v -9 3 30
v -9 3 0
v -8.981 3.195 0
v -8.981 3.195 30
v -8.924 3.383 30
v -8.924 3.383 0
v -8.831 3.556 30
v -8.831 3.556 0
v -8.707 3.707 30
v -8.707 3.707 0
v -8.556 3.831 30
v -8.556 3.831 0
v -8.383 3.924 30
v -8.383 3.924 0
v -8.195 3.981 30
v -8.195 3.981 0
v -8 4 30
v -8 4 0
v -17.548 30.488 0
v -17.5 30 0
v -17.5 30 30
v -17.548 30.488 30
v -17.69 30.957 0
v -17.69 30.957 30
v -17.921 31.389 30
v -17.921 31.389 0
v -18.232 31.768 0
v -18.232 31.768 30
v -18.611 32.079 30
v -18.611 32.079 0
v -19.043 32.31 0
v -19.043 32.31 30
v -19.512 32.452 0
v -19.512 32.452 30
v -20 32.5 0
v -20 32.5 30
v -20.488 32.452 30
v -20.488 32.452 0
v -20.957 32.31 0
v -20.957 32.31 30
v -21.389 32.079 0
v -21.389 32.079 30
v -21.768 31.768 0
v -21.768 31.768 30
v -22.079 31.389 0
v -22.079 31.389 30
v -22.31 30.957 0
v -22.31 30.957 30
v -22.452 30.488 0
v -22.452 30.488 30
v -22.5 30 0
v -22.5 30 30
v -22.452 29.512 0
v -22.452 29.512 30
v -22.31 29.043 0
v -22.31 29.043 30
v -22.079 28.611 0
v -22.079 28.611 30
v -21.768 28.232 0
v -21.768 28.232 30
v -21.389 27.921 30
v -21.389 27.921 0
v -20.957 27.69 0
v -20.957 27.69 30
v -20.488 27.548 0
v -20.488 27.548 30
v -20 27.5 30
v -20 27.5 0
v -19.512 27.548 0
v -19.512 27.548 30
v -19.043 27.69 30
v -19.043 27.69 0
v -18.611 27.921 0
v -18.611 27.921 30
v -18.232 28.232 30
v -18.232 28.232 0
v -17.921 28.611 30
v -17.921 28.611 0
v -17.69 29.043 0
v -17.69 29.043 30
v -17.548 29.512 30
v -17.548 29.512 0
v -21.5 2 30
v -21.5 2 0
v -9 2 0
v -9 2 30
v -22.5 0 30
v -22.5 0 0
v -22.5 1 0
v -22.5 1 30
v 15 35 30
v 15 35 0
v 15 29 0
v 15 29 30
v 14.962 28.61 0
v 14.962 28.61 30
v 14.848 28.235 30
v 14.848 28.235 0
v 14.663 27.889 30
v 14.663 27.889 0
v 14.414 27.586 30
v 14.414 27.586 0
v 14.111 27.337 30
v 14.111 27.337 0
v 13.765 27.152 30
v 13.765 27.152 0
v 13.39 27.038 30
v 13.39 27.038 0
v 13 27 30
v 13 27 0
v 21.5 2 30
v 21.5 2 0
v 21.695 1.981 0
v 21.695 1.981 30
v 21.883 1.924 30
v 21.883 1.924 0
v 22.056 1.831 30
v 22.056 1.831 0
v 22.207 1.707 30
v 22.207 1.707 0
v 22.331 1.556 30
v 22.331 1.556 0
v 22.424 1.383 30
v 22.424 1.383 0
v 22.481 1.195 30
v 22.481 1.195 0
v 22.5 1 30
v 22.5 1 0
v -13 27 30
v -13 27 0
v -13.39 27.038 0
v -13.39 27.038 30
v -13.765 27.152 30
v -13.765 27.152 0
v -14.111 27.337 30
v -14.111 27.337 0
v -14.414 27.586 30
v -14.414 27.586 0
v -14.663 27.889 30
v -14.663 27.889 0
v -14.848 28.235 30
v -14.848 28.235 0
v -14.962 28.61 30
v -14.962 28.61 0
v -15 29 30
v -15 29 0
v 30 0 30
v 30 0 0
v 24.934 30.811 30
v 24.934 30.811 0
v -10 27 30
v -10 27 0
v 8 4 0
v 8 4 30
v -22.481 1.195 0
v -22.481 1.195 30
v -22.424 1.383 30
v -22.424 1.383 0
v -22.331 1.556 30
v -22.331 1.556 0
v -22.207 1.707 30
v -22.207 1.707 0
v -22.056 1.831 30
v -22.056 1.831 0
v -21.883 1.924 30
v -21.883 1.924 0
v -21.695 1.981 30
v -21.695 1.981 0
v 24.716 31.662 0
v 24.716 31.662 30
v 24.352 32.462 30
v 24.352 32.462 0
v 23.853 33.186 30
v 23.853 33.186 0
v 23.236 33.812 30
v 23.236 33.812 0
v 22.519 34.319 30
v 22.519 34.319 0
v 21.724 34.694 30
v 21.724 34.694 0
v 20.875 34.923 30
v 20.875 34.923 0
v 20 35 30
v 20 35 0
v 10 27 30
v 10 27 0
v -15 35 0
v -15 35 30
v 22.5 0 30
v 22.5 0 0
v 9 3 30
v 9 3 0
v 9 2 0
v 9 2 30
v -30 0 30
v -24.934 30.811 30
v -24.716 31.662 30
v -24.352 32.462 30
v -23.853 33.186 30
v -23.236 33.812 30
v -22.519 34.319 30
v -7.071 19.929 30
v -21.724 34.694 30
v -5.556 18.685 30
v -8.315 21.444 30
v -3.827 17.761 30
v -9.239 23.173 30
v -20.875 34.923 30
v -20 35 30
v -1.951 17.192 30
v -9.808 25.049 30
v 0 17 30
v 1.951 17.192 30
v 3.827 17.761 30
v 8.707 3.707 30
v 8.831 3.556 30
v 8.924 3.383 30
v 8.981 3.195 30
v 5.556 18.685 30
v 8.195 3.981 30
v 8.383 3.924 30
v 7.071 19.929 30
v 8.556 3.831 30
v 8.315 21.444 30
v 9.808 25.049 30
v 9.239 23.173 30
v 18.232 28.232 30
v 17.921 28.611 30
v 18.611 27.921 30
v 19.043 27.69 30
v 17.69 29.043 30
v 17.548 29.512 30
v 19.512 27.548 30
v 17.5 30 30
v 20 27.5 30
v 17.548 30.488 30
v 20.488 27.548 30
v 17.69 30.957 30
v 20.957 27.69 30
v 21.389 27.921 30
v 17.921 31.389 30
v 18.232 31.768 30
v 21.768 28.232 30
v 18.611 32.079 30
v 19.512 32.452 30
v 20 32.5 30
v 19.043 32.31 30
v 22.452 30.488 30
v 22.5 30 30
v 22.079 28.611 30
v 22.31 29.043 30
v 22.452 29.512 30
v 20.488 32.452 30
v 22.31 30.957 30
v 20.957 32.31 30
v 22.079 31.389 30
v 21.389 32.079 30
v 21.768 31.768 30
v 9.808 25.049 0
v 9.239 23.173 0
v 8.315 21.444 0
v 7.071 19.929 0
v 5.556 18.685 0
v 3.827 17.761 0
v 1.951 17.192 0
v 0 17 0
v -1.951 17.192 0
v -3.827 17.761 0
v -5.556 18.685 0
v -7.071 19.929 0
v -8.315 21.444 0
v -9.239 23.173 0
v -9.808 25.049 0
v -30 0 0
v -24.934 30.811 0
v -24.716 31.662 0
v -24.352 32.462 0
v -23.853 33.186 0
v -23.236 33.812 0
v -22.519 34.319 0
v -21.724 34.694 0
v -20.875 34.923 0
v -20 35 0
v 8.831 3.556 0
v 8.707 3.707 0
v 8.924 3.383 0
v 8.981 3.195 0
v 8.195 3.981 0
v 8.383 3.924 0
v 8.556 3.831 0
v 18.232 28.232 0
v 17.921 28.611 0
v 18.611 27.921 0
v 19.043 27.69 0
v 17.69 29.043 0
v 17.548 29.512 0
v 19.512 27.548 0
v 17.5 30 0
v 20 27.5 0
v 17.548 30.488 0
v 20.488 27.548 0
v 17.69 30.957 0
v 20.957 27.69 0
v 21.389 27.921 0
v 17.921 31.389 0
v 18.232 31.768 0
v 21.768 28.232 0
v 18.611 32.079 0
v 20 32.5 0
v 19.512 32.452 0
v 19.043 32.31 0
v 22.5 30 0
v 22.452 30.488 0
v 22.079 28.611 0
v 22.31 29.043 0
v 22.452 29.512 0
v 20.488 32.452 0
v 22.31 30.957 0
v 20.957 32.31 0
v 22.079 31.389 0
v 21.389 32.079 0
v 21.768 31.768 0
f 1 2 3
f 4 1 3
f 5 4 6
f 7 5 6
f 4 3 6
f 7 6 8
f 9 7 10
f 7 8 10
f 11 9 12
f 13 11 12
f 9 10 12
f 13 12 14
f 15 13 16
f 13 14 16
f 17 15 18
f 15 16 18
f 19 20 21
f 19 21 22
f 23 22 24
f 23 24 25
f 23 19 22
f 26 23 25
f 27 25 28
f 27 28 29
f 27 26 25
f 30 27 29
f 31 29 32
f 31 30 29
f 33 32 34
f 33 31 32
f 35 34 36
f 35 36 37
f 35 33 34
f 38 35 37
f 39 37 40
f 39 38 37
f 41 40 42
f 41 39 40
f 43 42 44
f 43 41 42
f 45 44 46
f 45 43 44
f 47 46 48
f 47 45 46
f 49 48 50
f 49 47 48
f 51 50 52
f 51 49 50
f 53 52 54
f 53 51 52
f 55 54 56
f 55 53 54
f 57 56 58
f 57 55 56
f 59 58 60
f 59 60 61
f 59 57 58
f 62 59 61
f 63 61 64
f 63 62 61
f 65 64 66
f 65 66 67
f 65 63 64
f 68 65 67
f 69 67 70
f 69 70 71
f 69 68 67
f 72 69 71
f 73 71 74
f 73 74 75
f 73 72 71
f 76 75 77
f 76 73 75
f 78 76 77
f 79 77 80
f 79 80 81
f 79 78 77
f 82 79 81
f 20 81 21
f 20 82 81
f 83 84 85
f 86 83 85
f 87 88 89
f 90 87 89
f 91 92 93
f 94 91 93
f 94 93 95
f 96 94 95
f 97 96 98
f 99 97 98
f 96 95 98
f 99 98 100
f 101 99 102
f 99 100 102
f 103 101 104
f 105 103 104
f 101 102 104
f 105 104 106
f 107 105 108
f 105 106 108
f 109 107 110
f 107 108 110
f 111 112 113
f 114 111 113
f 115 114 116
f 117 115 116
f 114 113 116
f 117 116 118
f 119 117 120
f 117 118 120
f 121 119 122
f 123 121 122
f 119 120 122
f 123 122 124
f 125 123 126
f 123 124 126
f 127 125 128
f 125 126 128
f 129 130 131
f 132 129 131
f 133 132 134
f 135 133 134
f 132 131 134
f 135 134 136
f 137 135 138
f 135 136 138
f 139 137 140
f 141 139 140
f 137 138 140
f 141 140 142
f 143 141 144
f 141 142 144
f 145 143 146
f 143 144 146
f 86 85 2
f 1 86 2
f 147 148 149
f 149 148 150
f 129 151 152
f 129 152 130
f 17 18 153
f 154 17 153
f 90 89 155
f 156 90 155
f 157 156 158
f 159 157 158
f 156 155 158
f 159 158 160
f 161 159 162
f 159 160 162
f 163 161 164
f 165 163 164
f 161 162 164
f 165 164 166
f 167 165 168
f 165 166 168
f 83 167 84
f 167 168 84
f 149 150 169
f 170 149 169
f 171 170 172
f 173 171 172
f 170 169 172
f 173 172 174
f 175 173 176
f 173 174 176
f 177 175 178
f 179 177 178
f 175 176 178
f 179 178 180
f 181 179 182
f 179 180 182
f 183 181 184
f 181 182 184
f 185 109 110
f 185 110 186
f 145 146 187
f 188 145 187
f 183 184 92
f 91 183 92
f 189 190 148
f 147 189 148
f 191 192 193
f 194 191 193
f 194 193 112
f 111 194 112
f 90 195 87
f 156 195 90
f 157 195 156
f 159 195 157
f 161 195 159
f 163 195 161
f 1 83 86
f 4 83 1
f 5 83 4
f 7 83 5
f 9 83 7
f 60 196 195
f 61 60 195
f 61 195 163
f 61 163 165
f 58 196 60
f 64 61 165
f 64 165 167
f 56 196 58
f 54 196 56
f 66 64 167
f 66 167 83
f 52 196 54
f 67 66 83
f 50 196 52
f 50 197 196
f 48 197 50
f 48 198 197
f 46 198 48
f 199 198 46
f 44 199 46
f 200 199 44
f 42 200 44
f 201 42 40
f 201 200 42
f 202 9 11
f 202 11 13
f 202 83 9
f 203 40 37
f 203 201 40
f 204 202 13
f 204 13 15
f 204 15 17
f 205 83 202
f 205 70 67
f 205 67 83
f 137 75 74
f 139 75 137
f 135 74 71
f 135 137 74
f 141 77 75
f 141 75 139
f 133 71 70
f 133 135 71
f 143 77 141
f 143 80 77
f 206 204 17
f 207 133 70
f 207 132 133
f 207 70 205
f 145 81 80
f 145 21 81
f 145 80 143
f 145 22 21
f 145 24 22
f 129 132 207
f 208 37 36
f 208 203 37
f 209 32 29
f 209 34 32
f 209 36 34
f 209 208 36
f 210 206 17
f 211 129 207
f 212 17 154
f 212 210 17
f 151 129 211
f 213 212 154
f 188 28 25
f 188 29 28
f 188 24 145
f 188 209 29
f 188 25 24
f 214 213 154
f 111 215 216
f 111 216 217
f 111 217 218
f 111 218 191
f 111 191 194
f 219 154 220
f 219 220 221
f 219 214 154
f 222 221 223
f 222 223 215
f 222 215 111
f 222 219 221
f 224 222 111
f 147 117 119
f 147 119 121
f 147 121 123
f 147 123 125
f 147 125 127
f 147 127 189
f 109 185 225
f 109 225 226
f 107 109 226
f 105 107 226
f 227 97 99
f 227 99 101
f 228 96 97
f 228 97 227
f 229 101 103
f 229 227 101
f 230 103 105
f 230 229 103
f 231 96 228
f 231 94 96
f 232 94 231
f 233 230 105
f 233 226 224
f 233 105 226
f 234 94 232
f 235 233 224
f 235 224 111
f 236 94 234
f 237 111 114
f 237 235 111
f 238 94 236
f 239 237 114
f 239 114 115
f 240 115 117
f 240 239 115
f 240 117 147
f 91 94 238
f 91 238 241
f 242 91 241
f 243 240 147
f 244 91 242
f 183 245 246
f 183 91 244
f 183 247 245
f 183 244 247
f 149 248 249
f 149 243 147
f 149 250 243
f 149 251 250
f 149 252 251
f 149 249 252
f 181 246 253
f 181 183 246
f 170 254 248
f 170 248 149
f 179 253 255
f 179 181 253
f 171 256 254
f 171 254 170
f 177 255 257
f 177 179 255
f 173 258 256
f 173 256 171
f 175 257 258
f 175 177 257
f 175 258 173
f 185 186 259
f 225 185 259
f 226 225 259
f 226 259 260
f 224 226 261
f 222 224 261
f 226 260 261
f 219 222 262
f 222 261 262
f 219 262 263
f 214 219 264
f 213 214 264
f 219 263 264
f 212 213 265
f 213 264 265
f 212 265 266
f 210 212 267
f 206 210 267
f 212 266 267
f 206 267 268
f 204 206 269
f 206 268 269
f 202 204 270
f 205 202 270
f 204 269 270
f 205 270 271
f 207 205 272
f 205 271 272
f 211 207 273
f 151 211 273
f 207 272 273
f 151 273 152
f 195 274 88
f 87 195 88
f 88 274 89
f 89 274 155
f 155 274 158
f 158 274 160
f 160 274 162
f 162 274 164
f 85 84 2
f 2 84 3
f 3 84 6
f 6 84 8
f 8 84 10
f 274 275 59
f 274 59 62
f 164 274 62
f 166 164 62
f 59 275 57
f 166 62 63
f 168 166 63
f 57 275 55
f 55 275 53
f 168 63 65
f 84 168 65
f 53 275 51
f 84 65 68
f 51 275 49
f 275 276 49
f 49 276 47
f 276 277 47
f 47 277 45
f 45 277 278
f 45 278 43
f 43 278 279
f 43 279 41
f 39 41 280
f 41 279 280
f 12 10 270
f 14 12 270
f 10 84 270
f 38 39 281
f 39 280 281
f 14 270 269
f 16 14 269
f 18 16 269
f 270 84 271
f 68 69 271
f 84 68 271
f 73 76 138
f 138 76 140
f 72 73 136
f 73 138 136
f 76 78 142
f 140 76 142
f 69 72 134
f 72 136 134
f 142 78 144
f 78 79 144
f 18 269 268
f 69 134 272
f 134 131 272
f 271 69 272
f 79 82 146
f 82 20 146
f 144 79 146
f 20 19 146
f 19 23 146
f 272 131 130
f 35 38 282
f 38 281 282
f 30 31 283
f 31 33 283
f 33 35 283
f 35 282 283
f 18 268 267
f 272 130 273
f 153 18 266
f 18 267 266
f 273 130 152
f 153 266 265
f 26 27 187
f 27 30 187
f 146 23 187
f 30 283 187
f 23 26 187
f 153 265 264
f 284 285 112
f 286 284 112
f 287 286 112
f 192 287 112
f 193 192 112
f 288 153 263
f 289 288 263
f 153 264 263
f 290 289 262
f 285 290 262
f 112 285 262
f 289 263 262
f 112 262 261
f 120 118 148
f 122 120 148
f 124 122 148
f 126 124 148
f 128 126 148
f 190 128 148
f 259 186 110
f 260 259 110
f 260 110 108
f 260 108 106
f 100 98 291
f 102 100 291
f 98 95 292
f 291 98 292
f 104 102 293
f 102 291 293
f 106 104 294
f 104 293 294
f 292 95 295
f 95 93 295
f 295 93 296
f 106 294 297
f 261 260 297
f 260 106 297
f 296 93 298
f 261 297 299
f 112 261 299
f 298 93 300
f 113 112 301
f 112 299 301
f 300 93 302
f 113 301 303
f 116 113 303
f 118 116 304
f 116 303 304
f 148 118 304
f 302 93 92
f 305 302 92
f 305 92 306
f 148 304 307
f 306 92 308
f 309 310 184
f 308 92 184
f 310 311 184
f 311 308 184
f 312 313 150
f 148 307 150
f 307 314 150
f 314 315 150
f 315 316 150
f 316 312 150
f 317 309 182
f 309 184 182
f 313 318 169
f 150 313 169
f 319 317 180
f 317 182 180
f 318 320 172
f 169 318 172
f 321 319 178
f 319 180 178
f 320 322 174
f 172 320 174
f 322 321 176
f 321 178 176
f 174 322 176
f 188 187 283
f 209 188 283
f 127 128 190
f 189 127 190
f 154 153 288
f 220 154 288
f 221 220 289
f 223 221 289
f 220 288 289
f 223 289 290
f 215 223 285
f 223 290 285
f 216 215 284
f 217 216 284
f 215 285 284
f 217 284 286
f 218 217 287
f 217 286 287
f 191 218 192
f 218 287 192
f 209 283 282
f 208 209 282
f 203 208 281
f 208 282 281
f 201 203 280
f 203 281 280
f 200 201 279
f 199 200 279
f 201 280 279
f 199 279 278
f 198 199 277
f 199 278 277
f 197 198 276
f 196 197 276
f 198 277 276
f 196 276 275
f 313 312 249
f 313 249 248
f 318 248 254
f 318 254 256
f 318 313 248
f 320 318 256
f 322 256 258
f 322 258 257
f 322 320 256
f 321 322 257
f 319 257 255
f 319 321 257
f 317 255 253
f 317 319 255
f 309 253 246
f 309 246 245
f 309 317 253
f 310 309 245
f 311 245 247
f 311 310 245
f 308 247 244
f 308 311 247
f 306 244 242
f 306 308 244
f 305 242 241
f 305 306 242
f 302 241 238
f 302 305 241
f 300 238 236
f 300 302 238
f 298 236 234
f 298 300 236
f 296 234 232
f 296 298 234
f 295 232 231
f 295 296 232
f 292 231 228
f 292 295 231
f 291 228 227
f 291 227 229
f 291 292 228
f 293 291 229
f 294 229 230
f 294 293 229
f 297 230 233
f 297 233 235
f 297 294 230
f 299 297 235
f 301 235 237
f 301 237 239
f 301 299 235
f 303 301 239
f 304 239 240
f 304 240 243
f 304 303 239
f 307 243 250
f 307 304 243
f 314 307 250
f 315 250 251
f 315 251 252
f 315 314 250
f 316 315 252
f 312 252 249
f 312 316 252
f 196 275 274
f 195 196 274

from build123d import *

# Parameters (mm, degrees)
SKETCH1_R           = 2.5
BOSS_EXTRUDE1_DEPTH = 30


with BuildPart() as part:
    # Sketch1 → Boss-Extrude1 (new body)
    with BuildSketch(Plane.XY):
        with BuildLine():
            Line((-8, 4), (8, 4))
            ThreePointArc((8, 4), (8.707106781, 3.707106781), (9, 3))
            Line((9, 3), (9, 2))
            Line((9, 2), (21.5, 2))
            ThreePointArc((21.5, 2), (22.207106781, 1.707106781), (22.5, 1))
            Line((22.5, 1), (22.5, 0))
            Line((22.5, 0), (30, 0))
            Line((30, 0), (24.933748499, 30.8112495))
            ThreePointArc((24.933748499, 30.8112495), (23.236027851, 33.811577593), (20, 35))
            Line((20, 35), (15, 35))
            Line((15, 35), (15, 29))
            ThreePointArc((15, 29), (14.414213562, 27.585786438), (13, 27))
            Line((13, 27), (10, 27))
            ThreePointArc((10, 27), (0, 17), (-10, 27))
            Line((-10, 27), (-13, 27))
            ThreePointArc((-13, 27), (-14.414213562, 27.585786438), (-15, 29))
            Line((-15, 29), (-15, 35))
            Line((-15, 35), (-20, 35))
            ThreePointArc((-20, 35), (-23.236027851, 33.811577593), (-24.933748499, 30.8112495))
            Line((-24.933748499, 30.8112495), (-30, 0))
            Line((-30, 0), (-22.5, 0))
            Line((-22.5, 0), (-22.5, 1))
            ThreePointArc((-22.5, 1), (-22.207106781, 1.707106781), (-21.5, 2))
            Line((-21.5, 2), (-9, 2))
            Line((-9, 2), (-9, 3))
            ThreePointArc((-9, 3), (-8.707106781, 3.707106781), (-8, 4))
        make_face()
        with Locations((-20, 30)):
            Circle(SKETCH1_R, mode=Mode.SUBTRACT)
        with Locations((20, 30)):
            Circle(SKETCH1_R, mode=Mode.SUBTRACT)
    extrude(amount=BOSS_EXTRUDE1_DEPTH)


solid = part.part
